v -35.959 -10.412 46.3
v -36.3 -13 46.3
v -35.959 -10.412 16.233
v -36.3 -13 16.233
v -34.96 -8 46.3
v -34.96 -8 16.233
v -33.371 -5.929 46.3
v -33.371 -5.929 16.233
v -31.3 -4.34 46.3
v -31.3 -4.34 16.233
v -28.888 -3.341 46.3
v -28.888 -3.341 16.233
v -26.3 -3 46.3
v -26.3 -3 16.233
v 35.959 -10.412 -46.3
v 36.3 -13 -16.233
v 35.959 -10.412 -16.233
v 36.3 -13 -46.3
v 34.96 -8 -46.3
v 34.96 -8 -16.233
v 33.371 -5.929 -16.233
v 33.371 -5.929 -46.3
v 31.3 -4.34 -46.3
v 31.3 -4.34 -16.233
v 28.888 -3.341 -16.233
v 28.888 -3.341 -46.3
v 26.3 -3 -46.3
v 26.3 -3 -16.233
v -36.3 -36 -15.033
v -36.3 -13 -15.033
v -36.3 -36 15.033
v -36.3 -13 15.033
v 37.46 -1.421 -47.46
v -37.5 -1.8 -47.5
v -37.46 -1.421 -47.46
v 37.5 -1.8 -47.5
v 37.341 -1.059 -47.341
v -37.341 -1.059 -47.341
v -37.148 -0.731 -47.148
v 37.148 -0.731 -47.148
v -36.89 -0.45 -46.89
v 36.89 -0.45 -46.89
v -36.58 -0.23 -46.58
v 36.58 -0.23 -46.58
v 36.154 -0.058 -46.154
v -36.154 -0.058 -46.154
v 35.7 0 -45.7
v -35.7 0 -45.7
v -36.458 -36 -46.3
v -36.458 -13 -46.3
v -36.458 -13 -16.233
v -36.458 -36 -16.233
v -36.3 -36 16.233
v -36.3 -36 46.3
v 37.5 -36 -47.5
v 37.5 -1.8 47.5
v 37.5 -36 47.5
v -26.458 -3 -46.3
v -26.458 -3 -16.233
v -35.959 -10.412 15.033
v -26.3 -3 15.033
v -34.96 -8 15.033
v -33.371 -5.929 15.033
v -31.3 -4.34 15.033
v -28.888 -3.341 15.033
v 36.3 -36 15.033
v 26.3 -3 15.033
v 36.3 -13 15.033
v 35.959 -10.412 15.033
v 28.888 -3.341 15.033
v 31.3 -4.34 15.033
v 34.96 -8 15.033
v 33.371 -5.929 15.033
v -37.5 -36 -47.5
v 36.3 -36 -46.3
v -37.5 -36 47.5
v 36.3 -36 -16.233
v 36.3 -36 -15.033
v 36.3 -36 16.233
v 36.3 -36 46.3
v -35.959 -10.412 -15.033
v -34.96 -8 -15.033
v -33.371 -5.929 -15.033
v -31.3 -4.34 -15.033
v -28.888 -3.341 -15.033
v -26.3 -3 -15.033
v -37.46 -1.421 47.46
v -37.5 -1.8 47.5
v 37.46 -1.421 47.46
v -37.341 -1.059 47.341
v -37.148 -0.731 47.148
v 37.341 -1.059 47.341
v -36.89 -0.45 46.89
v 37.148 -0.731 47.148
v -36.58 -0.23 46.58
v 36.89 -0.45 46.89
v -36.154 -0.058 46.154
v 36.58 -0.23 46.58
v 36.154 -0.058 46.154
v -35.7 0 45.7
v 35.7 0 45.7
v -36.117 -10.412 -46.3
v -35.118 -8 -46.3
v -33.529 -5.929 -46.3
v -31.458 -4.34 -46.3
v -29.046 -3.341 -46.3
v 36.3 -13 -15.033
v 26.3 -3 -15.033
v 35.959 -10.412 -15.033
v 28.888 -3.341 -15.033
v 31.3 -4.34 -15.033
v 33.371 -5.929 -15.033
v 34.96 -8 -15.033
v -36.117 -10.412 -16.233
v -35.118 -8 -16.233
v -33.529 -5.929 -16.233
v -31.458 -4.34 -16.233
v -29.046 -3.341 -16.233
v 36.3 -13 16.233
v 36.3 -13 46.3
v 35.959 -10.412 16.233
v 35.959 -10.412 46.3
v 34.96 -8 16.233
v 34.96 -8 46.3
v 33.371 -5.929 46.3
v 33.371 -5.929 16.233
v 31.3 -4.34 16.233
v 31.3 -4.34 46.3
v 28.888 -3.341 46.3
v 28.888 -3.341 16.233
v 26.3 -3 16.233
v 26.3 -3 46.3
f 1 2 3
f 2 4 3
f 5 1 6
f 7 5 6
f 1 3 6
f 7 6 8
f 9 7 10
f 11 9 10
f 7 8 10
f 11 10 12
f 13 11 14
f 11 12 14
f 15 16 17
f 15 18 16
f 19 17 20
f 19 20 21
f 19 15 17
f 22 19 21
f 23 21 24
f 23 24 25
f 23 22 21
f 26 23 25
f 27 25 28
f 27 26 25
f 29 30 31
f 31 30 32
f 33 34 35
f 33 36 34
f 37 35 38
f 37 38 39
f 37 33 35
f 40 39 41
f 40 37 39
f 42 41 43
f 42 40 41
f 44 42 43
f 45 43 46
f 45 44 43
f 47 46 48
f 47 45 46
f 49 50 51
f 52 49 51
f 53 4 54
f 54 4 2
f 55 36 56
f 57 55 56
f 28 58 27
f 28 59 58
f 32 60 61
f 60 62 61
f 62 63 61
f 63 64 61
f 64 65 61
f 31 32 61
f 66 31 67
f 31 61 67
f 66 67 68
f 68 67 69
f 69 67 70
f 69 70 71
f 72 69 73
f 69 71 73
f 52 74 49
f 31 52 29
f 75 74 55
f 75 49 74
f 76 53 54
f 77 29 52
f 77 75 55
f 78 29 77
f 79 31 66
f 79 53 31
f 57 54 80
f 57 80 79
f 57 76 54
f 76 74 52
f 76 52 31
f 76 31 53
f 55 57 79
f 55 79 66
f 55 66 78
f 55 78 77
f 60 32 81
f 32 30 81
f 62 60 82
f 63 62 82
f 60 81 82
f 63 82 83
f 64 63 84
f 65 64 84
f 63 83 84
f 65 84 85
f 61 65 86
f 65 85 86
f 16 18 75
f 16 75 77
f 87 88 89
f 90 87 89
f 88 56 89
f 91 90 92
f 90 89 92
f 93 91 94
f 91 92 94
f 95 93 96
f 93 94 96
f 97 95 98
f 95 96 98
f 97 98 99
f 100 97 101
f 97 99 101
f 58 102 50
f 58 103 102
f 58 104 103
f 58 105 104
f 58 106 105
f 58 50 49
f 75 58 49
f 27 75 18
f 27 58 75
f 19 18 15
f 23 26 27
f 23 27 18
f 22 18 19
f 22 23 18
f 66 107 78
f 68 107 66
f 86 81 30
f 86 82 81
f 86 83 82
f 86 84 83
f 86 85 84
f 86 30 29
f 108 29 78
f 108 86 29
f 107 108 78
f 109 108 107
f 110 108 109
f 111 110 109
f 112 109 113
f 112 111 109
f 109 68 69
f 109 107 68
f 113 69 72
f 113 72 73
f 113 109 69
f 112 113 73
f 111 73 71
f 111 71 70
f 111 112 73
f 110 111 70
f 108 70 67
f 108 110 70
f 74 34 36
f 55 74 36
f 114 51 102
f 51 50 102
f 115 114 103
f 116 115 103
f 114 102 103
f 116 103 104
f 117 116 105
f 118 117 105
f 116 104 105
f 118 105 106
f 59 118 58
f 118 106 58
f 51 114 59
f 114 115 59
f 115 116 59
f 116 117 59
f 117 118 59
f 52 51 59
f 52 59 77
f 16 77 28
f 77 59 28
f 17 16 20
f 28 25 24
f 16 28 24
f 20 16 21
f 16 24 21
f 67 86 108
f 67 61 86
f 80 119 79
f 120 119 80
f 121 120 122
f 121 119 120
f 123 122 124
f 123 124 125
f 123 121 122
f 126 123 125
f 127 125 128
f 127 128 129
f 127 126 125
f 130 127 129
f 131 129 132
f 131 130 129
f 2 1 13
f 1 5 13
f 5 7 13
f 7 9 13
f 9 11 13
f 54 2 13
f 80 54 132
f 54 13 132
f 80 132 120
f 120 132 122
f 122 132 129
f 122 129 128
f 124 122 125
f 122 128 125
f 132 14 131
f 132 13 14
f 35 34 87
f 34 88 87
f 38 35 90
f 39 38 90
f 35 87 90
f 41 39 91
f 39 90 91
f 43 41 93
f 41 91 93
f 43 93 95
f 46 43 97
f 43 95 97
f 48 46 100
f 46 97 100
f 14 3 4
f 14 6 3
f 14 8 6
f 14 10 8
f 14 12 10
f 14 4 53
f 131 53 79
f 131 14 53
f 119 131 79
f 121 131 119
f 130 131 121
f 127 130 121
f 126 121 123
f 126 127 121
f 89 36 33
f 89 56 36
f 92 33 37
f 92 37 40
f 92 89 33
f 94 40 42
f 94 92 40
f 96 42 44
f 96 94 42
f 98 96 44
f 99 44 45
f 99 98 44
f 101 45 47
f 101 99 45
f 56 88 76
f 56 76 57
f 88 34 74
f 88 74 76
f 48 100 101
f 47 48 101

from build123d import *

# Parameters (mm, degrees)
SKETCH017_W   = 75
SKETCH017_H   = 95
PAD013_DEPTH  = 3
SKETCH018_W   = 75
SKETCH018_H   = 95
SKETCH018_W_2 = 72.6
SKETCH018_H_2 = 30.066667
SKETCH018_H_3 = 30.066666
SKETCH018_W_3 = 72.757653
PAD014_DEPTH  = 35
FILLET012_R   = 1.8
FILLET013_R   = 10


with BuildPart() as part:
    # Sketch017 → Pad013 (new body)
    with BuildSketch(Plane.XZ):
        Rectangle(SKETCH017_W, SKETCH017_H)
    extrude(amount=PAD013_DEPTH)

    # Sketch018 → Pad014 (join)
    with BuildSketch(Plane.XZ.offset(1)):
        Rectangle(SKETCH018_W, SKETCH018_H)
        with Locations((0, 31.266666)):
            Rectangle(SKETCH018_W_2, SKETCH018_H_2, mode=Mode.SUBTRACT)
        Rectangle(SKETCH018_W_2, SKETCH018_H_3, mode=Mode.SUBTRACT)
        with Locations((-0.078827, -31.266666)):
            Rectangle(SKETCH018_W_3, SKETCH018_H_2, mode=Mode.SUBTRACT)
    extrude(amount=PAD014_DEPTH)

    # Fillet012
    fillet012_edges = [part.edges().sort_by_distance(p)[0] for p in [
        (0, 0, 47.5),
        (37.5, 0, 0),
        (0, 0, -47.5),
        (-37.5, 0, 0),
    ]]
    fillet(fillet012_edges, radius=FILLET012_R)

    # Fillet013
    fillet013_edges = [part.edges().sort_by_distance(p)[0] for p in [
        (36.3, -3, 31.266667),
        (36.3, -3, 0),
        (36.3, -3, -31.266667),
        (-36.3, -3, 31.266667),
        (-36.3, -3, 0),
        (-36.457653, -3, -31.266667),
    ]]
    fillet(fillet013_edges, radius=FILLET013_R)


solid = part.part
